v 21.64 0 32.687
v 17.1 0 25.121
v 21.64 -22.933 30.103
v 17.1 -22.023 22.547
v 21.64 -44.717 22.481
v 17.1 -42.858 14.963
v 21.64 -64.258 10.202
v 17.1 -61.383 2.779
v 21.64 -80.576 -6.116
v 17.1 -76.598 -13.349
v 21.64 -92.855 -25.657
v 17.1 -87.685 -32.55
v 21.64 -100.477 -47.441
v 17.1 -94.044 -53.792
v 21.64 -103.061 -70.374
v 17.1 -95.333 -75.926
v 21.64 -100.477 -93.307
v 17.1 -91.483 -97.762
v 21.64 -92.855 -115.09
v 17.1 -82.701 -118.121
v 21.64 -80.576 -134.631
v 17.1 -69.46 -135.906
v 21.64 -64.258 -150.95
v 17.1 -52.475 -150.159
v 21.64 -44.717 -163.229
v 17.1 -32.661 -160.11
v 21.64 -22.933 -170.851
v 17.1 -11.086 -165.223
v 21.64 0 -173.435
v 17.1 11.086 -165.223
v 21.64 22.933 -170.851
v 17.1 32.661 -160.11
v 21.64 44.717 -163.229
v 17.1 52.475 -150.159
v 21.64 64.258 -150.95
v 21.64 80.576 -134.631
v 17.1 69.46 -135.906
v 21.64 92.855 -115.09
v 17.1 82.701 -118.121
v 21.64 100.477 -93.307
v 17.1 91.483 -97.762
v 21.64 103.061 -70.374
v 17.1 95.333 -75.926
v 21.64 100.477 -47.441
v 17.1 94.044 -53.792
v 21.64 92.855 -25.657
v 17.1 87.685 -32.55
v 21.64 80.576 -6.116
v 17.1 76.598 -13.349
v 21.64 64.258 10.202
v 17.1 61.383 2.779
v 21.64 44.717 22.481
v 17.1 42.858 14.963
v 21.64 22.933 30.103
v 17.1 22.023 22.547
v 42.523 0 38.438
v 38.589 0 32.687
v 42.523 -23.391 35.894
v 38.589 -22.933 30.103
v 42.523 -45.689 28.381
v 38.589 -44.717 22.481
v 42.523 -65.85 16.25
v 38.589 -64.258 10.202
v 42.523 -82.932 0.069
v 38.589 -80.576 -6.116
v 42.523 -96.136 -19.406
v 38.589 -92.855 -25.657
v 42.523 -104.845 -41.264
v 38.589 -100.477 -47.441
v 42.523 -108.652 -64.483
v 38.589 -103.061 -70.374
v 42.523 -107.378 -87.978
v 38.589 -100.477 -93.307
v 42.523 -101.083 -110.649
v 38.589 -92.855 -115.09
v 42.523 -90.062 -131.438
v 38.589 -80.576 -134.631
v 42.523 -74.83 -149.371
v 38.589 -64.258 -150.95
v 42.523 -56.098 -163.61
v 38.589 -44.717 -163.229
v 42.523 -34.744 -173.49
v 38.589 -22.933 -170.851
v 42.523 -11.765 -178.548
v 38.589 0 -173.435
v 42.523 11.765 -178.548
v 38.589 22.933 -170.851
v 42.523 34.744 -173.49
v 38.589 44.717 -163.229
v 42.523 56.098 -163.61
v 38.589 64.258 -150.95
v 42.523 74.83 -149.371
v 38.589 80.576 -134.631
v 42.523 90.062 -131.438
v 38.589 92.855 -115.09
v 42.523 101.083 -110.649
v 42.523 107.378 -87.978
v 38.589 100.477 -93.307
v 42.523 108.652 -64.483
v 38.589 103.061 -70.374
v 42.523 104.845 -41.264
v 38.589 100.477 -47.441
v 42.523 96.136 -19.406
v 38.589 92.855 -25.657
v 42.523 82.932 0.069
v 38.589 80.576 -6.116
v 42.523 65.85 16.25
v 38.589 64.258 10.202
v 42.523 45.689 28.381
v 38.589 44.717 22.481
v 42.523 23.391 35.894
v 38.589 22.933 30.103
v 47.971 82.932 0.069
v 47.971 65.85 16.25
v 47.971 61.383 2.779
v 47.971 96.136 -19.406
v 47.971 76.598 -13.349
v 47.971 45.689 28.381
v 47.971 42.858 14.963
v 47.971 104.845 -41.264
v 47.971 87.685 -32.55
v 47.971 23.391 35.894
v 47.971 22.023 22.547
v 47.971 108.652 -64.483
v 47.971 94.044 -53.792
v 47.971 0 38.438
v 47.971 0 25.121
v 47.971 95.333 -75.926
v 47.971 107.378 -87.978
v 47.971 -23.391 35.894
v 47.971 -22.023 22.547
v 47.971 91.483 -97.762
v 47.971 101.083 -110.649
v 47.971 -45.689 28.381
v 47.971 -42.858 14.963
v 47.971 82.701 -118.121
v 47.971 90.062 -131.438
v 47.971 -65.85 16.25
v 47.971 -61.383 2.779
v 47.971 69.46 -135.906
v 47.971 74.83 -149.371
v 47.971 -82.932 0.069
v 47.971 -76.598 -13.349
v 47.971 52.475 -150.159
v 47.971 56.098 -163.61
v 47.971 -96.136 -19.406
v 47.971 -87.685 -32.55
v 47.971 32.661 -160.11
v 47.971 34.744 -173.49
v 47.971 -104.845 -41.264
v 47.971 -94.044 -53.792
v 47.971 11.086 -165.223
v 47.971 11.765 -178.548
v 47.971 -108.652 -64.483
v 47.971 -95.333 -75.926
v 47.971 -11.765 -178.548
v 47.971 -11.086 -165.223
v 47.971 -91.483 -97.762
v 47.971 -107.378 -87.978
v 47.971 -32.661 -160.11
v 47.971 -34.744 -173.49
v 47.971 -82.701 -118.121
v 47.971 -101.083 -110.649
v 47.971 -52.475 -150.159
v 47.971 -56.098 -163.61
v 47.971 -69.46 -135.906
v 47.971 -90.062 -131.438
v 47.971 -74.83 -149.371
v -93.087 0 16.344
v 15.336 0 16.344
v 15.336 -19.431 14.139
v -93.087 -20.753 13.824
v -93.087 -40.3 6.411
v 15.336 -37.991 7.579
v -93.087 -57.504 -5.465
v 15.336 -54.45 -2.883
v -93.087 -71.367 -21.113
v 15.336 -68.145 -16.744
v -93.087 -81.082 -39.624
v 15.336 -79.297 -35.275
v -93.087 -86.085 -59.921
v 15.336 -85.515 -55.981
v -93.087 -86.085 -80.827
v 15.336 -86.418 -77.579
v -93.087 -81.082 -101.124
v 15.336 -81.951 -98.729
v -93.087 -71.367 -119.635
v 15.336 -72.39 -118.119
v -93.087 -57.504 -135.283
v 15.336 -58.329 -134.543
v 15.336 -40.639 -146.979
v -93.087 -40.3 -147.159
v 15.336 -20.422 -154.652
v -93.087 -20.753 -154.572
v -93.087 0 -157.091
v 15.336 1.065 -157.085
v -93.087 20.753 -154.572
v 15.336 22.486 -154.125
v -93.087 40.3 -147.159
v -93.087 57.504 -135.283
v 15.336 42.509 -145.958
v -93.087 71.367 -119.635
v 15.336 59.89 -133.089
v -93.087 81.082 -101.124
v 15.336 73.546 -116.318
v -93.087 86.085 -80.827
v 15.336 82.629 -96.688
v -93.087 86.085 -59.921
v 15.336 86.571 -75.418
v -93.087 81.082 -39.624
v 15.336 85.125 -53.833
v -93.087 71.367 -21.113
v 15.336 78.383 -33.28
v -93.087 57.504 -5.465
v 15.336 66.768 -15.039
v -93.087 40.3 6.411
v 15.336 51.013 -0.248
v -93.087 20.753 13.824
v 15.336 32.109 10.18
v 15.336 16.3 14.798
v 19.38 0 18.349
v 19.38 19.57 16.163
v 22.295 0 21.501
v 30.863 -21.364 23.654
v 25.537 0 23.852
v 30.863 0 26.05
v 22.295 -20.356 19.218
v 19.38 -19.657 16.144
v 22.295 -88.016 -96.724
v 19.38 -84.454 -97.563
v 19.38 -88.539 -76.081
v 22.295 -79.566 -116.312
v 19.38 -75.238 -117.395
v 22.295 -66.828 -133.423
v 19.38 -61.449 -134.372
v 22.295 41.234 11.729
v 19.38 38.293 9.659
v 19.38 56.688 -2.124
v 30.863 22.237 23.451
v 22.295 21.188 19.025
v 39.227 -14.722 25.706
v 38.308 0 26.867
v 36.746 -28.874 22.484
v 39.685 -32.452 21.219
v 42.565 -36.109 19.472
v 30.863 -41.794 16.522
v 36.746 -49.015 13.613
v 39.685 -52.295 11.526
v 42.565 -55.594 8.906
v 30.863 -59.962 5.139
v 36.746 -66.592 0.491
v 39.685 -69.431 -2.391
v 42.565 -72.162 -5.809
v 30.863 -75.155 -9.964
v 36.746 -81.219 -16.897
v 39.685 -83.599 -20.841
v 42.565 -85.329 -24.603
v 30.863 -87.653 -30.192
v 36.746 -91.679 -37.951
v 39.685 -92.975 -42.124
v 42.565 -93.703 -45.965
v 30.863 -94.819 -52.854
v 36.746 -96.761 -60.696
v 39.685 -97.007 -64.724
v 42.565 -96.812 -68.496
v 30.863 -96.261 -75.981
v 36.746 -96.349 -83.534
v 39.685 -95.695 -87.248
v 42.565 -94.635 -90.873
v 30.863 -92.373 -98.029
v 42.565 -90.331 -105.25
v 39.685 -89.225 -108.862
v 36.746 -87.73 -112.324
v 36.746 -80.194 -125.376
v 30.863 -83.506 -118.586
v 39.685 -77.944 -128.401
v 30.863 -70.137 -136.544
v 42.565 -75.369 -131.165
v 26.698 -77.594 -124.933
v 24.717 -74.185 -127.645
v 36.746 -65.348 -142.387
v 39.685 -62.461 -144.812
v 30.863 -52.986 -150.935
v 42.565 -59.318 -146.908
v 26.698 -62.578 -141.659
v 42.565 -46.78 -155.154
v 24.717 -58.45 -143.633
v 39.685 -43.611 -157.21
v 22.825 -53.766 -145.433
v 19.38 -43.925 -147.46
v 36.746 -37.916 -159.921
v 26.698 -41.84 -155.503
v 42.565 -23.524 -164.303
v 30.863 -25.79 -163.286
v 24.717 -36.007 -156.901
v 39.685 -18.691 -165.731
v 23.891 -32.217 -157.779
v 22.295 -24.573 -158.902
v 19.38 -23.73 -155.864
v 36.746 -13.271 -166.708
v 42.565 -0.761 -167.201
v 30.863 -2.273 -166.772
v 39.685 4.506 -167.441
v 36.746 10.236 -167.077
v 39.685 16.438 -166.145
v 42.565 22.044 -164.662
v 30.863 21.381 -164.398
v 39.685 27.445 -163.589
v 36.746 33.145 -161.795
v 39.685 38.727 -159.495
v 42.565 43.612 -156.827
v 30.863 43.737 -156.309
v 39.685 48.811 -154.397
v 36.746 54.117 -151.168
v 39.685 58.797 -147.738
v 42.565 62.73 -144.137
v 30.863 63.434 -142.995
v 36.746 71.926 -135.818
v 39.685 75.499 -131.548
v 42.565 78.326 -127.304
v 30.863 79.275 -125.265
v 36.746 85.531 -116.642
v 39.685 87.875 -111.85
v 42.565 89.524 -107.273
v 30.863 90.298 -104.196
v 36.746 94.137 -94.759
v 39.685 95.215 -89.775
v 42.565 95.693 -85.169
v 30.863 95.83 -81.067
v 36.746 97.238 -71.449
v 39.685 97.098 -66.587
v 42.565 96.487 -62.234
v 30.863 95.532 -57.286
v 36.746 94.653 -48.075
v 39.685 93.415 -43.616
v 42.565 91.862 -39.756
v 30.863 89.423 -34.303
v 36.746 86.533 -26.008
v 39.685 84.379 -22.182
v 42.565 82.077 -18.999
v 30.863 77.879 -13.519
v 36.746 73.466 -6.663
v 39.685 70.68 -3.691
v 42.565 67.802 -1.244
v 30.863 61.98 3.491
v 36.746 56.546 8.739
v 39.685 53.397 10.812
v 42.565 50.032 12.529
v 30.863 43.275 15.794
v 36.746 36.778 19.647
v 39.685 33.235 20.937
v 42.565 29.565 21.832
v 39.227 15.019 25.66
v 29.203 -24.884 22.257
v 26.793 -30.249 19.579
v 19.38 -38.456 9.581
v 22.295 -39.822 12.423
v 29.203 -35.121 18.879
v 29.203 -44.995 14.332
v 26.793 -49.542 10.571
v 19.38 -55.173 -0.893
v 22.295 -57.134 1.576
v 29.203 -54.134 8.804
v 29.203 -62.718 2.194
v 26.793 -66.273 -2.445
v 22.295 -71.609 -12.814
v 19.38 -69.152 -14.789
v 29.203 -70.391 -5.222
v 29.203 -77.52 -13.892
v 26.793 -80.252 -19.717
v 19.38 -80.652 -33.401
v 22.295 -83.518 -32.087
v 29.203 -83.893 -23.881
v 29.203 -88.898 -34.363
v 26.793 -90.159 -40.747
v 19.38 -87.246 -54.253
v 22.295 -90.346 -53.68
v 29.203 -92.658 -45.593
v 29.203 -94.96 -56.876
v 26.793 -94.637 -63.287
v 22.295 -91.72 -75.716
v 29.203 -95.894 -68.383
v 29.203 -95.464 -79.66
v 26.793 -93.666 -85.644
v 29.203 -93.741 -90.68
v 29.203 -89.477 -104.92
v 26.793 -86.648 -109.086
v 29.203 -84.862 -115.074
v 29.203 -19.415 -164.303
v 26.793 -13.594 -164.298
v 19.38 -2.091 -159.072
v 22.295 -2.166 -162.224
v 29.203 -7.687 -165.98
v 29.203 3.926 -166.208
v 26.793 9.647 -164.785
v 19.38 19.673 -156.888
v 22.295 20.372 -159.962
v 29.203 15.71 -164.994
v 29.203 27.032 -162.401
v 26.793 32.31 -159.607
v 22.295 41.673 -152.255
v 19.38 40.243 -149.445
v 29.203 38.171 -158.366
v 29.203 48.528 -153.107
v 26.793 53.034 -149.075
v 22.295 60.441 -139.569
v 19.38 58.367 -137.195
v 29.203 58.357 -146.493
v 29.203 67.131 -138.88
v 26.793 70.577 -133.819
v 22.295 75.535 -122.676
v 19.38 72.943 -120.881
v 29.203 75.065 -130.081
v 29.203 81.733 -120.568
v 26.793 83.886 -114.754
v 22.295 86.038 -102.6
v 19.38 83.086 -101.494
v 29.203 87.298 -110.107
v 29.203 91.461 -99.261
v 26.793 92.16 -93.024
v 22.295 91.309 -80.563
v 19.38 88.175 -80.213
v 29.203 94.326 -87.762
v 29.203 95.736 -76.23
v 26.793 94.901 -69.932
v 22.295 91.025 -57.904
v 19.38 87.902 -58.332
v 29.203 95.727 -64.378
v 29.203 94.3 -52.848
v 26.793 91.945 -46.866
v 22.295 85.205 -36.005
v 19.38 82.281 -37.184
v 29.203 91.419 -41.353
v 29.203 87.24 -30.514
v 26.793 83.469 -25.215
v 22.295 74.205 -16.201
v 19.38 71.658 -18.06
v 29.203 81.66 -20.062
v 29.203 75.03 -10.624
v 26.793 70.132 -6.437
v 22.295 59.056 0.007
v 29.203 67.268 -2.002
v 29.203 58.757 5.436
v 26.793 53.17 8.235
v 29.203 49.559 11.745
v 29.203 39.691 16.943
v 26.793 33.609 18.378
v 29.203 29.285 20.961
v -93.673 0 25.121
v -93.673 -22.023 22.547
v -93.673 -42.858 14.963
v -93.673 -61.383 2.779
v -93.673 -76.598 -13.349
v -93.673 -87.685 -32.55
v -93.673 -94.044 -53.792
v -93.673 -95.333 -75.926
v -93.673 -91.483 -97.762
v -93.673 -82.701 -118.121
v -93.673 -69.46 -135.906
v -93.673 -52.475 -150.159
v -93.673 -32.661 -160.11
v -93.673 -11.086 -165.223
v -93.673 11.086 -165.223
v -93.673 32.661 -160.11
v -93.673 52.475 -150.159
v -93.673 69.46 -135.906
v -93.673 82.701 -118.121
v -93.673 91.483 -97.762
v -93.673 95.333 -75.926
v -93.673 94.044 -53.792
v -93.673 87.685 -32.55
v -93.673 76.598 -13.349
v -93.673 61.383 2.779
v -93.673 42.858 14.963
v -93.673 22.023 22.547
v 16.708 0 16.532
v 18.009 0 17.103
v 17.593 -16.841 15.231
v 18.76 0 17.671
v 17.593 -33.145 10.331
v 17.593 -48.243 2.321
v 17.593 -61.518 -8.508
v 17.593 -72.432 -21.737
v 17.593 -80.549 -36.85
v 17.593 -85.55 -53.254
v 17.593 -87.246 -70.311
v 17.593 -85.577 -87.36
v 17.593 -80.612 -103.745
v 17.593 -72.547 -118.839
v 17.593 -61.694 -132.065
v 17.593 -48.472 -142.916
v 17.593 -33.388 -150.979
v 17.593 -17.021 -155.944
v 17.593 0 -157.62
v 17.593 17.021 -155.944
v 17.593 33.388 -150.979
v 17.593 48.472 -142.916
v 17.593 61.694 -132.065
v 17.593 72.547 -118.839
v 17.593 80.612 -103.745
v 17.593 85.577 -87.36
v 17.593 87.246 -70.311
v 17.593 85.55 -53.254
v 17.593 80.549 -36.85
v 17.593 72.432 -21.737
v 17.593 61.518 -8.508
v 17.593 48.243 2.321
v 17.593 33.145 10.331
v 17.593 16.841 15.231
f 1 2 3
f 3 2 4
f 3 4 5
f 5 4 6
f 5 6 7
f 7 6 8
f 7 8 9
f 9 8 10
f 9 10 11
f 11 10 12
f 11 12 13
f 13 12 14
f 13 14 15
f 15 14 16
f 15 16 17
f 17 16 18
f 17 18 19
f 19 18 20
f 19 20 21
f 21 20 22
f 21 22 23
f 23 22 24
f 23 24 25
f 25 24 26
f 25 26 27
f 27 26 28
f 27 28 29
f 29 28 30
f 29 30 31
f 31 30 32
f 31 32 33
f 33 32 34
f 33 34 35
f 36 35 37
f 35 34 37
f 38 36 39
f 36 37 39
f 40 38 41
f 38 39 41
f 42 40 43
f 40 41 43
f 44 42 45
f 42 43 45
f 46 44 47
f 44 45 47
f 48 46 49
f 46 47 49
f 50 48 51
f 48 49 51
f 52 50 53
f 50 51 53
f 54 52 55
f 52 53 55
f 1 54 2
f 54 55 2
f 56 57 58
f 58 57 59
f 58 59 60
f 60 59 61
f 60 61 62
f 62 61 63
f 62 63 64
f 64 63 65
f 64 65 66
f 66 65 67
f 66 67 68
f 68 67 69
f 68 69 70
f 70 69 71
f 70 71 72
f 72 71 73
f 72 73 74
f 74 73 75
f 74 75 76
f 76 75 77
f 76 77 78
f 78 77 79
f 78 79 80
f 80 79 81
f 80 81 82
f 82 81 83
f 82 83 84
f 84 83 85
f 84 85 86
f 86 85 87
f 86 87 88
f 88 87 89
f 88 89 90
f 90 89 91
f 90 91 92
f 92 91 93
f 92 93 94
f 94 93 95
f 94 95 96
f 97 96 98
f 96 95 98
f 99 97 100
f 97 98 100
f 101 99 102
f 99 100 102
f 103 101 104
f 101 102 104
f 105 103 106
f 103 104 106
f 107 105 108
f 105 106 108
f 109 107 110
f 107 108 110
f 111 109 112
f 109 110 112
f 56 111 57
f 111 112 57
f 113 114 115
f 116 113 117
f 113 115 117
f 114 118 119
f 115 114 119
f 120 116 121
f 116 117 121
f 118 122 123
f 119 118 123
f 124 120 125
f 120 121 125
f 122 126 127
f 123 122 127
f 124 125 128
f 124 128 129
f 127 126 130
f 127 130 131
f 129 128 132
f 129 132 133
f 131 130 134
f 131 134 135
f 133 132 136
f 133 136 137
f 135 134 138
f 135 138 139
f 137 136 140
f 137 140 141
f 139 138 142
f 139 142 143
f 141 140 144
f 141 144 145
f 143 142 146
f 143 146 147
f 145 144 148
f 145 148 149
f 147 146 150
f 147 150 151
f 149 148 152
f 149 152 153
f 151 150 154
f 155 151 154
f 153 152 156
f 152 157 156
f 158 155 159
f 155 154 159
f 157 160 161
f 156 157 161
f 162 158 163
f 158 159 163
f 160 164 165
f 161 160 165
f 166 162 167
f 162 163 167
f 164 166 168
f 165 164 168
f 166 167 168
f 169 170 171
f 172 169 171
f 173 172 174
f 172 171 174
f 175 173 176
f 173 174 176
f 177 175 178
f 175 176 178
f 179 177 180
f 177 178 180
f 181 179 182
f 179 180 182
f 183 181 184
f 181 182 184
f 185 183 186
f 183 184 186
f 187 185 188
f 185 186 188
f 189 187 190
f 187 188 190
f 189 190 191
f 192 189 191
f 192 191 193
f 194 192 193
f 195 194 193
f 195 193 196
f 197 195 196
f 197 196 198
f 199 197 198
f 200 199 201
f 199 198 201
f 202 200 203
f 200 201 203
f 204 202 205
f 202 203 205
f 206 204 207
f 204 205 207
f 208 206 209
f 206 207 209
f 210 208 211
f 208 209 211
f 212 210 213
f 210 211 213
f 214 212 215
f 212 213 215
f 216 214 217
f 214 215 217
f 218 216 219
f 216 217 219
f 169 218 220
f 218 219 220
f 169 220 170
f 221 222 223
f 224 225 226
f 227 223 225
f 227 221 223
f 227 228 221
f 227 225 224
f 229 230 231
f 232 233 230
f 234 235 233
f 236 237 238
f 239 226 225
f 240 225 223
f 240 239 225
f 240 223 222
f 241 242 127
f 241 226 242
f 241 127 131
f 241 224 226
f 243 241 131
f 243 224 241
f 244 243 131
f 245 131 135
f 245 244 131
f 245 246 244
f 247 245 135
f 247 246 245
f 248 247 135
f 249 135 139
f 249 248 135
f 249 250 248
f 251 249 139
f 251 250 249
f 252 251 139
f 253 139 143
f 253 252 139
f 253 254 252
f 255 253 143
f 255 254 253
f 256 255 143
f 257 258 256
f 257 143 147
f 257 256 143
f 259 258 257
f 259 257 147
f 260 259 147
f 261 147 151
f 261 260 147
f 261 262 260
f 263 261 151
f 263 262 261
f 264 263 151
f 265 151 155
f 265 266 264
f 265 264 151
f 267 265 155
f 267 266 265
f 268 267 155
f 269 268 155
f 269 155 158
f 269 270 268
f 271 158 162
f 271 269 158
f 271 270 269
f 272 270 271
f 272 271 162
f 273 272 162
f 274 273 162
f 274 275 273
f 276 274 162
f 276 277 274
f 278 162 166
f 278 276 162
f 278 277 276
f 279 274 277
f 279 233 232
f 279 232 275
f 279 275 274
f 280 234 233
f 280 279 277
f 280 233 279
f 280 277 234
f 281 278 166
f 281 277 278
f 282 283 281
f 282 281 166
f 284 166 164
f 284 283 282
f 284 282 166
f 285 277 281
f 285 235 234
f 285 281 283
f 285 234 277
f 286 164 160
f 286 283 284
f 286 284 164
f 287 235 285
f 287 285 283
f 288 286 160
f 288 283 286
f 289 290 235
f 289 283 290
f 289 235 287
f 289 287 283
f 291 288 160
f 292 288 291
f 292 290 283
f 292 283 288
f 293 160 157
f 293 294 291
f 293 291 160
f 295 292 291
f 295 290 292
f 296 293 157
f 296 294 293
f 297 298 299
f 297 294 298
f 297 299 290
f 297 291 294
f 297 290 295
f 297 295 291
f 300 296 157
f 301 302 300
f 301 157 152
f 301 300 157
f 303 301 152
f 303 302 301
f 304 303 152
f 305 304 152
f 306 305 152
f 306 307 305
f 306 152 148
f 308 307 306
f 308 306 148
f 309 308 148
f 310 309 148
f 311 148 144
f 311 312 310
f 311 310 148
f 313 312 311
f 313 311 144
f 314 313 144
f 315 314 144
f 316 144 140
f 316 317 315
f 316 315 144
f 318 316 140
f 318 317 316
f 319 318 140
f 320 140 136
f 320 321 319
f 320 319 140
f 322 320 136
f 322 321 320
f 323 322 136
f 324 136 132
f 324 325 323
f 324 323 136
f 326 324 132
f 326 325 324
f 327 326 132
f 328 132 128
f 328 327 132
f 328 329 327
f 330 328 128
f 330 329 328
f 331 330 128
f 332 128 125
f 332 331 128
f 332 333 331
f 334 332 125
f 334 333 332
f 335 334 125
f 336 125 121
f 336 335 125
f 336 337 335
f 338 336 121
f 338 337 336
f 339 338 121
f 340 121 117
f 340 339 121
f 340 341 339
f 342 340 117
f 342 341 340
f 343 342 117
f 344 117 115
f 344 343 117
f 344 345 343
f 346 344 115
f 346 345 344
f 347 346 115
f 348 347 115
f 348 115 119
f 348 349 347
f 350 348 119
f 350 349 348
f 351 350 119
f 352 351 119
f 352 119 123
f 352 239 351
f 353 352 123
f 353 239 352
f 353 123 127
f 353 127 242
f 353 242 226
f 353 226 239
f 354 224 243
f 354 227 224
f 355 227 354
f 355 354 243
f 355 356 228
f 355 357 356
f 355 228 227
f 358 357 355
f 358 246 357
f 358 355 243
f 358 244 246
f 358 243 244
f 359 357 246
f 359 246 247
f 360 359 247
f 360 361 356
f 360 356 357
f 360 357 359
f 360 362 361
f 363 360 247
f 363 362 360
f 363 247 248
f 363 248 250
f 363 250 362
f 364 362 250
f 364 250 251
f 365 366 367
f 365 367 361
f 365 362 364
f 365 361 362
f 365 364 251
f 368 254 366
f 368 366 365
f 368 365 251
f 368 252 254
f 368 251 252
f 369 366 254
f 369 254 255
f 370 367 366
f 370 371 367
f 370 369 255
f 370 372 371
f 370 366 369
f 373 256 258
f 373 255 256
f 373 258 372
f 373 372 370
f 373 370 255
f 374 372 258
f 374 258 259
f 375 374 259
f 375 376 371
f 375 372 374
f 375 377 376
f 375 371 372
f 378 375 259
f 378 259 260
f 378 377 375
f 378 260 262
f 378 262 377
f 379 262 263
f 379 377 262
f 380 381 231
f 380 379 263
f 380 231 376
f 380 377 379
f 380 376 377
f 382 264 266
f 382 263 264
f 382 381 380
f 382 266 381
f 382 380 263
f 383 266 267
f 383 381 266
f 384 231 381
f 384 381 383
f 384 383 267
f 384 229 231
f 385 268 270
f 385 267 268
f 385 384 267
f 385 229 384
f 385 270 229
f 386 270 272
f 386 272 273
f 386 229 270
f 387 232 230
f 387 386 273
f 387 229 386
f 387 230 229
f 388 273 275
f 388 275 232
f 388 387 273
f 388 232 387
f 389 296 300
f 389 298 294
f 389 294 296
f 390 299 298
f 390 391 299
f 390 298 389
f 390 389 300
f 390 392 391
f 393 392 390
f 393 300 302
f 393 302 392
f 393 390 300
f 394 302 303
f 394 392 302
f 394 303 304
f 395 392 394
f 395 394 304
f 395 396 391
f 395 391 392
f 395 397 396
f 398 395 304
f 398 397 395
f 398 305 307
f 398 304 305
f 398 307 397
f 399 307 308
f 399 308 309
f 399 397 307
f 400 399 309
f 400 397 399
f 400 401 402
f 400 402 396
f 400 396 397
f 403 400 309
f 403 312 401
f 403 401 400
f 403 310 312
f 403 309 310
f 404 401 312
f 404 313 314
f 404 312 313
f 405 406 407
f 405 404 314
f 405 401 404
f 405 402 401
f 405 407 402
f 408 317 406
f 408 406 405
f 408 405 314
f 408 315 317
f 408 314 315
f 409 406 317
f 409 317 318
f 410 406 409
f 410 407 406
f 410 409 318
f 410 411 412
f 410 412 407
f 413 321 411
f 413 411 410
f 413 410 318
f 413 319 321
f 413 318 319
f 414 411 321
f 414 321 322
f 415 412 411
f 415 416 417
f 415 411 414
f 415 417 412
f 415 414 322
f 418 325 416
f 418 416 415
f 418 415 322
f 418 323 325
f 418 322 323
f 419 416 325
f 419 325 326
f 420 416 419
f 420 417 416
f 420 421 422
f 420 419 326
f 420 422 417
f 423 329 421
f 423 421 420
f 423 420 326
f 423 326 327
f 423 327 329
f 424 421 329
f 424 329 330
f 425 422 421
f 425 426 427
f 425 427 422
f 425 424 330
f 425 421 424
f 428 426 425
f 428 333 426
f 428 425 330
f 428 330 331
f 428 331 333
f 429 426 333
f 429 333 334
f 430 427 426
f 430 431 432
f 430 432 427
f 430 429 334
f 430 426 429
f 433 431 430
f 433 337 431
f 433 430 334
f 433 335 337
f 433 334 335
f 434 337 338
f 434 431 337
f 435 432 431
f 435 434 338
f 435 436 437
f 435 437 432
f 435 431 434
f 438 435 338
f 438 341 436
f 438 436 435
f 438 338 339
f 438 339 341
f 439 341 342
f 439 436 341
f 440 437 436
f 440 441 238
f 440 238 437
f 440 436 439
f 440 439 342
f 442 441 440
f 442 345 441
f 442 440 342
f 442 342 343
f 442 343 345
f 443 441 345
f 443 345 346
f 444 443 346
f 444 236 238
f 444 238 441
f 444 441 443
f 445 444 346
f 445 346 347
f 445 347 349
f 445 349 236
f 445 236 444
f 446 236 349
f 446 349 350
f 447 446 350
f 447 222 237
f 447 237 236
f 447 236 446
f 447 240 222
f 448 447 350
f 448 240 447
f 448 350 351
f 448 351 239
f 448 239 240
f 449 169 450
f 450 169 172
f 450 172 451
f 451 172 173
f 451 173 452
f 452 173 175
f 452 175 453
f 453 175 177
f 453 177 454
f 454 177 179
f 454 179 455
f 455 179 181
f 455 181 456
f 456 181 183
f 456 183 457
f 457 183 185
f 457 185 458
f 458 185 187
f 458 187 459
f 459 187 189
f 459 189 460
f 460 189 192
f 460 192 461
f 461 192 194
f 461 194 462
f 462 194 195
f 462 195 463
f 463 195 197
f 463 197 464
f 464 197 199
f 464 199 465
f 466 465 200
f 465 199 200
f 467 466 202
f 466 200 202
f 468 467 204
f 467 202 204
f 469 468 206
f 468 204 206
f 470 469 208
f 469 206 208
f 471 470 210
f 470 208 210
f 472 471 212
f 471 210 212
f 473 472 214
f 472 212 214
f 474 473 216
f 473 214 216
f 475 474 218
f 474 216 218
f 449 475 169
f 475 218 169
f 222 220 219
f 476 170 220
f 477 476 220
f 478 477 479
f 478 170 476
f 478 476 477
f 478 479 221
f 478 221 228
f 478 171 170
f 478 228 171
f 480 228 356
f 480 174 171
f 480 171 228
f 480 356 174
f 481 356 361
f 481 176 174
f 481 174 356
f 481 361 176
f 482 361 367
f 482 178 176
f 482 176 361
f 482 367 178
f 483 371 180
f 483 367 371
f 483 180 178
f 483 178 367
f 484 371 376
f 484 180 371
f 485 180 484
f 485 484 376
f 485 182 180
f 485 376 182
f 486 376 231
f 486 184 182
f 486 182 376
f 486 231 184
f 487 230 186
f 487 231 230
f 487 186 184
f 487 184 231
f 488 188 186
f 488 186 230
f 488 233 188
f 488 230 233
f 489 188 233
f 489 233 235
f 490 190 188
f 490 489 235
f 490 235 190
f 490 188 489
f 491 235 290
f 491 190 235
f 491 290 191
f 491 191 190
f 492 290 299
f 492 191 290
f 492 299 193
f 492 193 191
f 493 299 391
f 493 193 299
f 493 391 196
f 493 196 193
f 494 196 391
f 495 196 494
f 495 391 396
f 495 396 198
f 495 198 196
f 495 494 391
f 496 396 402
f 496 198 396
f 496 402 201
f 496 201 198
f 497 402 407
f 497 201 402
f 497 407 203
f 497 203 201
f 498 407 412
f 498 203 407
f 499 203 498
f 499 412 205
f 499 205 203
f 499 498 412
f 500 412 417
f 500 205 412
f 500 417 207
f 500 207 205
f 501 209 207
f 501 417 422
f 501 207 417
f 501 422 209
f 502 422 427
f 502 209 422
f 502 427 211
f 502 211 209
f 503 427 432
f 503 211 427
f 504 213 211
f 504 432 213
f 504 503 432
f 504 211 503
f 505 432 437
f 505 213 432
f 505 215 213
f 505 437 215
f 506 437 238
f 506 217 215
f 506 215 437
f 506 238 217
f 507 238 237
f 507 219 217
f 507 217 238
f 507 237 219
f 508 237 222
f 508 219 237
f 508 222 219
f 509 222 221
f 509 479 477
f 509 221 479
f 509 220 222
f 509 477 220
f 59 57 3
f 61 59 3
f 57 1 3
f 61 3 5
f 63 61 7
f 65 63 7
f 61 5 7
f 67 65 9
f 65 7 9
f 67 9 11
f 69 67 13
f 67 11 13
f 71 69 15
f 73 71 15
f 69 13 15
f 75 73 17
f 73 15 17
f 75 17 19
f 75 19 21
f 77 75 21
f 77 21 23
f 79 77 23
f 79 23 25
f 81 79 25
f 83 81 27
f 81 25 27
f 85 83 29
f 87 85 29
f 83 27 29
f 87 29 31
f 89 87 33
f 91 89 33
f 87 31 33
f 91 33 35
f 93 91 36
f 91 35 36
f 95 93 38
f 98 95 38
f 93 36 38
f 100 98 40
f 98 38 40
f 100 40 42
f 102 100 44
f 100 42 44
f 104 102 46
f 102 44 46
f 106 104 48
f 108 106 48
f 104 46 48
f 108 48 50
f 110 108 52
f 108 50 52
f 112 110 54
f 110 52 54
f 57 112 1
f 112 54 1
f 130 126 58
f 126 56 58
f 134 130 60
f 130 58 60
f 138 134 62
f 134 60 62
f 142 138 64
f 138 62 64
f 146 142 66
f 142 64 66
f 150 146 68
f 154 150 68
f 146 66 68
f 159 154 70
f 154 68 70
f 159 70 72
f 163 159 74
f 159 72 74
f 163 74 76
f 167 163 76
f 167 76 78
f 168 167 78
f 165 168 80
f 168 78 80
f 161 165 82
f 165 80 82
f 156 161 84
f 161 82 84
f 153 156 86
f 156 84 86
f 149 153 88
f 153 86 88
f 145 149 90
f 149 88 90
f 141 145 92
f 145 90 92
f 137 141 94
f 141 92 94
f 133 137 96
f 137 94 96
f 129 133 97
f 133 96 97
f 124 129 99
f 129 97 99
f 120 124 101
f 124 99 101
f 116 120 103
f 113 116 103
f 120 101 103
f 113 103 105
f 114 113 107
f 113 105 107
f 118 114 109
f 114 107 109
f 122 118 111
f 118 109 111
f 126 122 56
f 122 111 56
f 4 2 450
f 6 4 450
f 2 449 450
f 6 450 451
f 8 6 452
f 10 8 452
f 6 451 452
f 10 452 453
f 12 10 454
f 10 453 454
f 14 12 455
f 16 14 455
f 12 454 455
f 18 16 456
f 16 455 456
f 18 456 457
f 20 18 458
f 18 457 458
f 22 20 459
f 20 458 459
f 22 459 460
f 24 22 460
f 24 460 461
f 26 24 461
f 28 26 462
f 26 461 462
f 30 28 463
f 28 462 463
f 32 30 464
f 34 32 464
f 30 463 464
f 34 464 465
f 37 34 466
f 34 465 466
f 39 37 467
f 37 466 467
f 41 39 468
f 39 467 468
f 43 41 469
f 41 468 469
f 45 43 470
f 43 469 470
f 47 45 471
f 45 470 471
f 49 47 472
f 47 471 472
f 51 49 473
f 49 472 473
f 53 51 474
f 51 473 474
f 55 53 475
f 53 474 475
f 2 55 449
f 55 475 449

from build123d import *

# Parameters (mm, degrees)
F2_R = 5.08


with BuildPart() as f1:
    # F0 (on Front) → F1 (revolve)
    with BuildSketch(Plane.XZ):
        with BuildLine():
            Line((17.1001888812, 25.1206345856), (-93.6727151275, 25.1206345856))
            Line((-93.6727151275, 25.1206345856), (-93.0865481496, 16.3435470313))
            Line((-93.0865481496, 16.3435470313), (18.0081669241, 16.3435470313))
            add(Edge.make_bspline(
                [(47.9713305831, 25.1206345856), (38.5889224708, 28.2450132072), (25.3282189369, 28.2450132072), (18.0081669241, 16.3435470313)],
                knots=[0, 0, 0, 0, 31.2222427508, 31.2222427508, 31.2222427508, 31.2222427508], degree=3))
            Line((47.9713305831, 25.1206345856), (47.9713305831, 38.4375974536))
            Line((47.9713305831, 38.4375974536), (42.5234809518, 38.4375974536))
            Line((42.5234809518, 38.4375974536), (38.5889224708, 32.6870903373))
            Line((38.5889224708, 32.6870903373), (21.6400604695, 32.6870903373))
            Line((21.6400604695, 32.6870903373), (17.1001888812, 25.1206345856))
        make_face()
    revolve(axis=Axis((-9.7643062472, 0, -70.3739747405), (1, 0, 0)))

    # F2
    f2_edges = [f1.edges().sort_by_distance(p)[0] for p in [
        (18.008167, 0, -157.091497),
    ]]
    fillet(f2_edges, radius=F2_R)


solid = f1.part
